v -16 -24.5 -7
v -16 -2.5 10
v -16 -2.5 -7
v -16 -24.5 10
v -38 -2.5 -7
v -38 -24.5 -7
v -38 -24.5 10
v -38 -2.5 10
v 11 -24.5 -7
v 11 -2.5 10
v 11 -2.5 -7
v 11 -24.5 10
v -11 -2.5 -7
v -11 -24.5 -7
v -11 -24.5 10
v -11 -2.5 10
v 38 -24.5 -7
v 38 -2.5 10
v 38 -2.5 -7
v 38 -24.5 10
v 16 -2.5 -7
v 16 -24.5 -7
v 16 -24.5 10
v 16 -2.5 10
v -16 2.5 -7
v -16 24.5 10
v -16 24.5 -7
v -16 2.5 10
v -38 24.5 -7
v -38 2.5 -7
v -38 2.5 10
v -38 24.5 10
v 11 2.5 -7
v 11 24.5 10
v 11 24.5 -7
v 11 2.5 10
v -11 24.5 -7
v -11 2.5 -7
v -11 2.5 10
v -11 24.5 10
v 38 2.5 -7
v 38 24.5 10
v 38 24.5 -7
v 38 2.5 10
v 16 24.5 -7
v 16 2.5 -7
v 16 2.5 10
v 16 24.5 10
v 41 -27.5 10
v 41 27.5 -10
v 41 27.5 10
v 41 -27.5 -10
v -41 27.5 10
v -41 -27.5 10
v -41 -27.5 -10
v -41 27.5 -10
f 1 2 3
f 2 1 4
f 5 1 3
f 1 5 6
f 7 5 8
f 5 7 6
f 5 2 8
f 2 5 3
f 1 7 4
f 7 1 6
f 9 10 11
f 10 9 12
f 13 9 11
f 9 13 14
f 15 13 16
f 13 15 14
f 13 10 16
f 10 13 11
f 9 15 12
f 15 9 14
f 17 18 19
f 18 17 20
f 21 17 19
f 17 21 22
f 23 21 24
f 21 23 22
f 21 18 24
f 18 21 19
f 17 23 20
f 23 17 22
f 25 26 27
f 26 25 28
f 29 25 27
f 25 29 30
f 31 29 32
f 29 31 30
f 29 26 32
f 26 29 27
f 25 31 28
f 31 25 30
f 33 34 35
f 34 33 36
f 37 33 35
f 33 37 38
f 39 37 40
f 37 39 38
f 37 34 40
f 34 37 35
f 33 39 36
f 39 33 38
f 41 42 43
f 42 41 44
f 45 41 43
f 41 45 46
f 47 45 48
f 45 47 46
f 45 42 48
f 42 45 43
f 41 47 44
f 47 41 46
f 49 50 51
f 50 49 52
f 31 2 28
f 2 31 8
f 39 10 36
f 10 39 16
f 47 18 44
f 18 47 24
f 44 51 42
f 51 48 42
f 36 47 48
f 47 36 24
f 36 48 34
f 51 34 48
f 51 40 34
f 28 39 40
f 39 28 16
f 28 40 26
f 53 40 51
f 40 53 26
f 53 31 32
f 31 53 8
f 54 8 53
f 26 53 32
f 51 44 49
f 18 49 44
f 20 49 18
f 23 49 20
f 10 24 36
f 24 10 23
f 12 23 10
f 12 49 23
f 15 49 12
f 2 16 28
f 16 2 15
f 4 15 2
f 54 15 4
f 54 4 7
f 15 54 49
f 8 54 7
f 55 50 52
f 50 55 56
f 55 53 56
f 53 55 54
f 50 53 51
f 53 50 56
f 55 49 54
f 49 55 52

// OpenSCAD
$fn = 32;

// ----------------------------------------------------------------------
// Pocket plate 82 x 55 x 20
// 2 x 3 pockets 22 mm square, 17 mm deep
// ----------------------------------------------------------------------

// --- parameters (mm) ---
thickness = 20;  // plate thickness
floor_t = 3;     // material left under each pocket
pocket = 22;     // pocket side length
pitch_x = 27;    // pocket pitch along X
pitch_y = 27;    // pocket pitch along Y
cols = 3;        // pockets per row
rows = 2;        // rows of pockets

// --- derived feature positions (mm) ---
depth = thickness - floor_t;        // = 17   pocket depth, down to the floor
span_x = (cols - 1) * pitch_x;      // = 54   distance between outer pockets
span_y = (rows - 1) * pitch_y;      // = 27   distance between outer pocket rows
origin_x = -span_x / 2;             // = -27   X of the first pocket
origin_y = -span_y / 2;             // = -13.5   Y of the first pocket
plate = [span_x + pocket + 6, span_y + pocket + 6, thickness];  // = [82, 55, 20]   overall size: pockets plus 3 mm of wall on each side
feature_centers = [
  [origin_x + 0 * pitch_x, origin_y + 0 * pitch_y],
  [origin_x + 1 * pitch_x, origin_y + 0 * pitch_y],
  [origin_x + 2 * pitch_x, origin_y + 0 * pitch_y],
  [origin_x + 0 * pitch_x, origin_y + 1 * pitch_y],
  [origin_x + 1 * pitch_x, origin_y + 1 * pitch_y],
  [origin_x + 2 * pitch_x, origin_y + 1 * pitch_y]
];   // pocket centres, used verbatim by the cutter loop

// plate outline, then one pocket per centre in feature_centers
difference() {
  cube(plate, center = true);
  for (centre = feature_centers)
    translate([centre[0] - pocket / 2, centre[1] - pocket / 2, plate[2] / 2 - depth])
      cube([pocket, pocket, depth + 1]);  // centred on the declared pocket centre
}
